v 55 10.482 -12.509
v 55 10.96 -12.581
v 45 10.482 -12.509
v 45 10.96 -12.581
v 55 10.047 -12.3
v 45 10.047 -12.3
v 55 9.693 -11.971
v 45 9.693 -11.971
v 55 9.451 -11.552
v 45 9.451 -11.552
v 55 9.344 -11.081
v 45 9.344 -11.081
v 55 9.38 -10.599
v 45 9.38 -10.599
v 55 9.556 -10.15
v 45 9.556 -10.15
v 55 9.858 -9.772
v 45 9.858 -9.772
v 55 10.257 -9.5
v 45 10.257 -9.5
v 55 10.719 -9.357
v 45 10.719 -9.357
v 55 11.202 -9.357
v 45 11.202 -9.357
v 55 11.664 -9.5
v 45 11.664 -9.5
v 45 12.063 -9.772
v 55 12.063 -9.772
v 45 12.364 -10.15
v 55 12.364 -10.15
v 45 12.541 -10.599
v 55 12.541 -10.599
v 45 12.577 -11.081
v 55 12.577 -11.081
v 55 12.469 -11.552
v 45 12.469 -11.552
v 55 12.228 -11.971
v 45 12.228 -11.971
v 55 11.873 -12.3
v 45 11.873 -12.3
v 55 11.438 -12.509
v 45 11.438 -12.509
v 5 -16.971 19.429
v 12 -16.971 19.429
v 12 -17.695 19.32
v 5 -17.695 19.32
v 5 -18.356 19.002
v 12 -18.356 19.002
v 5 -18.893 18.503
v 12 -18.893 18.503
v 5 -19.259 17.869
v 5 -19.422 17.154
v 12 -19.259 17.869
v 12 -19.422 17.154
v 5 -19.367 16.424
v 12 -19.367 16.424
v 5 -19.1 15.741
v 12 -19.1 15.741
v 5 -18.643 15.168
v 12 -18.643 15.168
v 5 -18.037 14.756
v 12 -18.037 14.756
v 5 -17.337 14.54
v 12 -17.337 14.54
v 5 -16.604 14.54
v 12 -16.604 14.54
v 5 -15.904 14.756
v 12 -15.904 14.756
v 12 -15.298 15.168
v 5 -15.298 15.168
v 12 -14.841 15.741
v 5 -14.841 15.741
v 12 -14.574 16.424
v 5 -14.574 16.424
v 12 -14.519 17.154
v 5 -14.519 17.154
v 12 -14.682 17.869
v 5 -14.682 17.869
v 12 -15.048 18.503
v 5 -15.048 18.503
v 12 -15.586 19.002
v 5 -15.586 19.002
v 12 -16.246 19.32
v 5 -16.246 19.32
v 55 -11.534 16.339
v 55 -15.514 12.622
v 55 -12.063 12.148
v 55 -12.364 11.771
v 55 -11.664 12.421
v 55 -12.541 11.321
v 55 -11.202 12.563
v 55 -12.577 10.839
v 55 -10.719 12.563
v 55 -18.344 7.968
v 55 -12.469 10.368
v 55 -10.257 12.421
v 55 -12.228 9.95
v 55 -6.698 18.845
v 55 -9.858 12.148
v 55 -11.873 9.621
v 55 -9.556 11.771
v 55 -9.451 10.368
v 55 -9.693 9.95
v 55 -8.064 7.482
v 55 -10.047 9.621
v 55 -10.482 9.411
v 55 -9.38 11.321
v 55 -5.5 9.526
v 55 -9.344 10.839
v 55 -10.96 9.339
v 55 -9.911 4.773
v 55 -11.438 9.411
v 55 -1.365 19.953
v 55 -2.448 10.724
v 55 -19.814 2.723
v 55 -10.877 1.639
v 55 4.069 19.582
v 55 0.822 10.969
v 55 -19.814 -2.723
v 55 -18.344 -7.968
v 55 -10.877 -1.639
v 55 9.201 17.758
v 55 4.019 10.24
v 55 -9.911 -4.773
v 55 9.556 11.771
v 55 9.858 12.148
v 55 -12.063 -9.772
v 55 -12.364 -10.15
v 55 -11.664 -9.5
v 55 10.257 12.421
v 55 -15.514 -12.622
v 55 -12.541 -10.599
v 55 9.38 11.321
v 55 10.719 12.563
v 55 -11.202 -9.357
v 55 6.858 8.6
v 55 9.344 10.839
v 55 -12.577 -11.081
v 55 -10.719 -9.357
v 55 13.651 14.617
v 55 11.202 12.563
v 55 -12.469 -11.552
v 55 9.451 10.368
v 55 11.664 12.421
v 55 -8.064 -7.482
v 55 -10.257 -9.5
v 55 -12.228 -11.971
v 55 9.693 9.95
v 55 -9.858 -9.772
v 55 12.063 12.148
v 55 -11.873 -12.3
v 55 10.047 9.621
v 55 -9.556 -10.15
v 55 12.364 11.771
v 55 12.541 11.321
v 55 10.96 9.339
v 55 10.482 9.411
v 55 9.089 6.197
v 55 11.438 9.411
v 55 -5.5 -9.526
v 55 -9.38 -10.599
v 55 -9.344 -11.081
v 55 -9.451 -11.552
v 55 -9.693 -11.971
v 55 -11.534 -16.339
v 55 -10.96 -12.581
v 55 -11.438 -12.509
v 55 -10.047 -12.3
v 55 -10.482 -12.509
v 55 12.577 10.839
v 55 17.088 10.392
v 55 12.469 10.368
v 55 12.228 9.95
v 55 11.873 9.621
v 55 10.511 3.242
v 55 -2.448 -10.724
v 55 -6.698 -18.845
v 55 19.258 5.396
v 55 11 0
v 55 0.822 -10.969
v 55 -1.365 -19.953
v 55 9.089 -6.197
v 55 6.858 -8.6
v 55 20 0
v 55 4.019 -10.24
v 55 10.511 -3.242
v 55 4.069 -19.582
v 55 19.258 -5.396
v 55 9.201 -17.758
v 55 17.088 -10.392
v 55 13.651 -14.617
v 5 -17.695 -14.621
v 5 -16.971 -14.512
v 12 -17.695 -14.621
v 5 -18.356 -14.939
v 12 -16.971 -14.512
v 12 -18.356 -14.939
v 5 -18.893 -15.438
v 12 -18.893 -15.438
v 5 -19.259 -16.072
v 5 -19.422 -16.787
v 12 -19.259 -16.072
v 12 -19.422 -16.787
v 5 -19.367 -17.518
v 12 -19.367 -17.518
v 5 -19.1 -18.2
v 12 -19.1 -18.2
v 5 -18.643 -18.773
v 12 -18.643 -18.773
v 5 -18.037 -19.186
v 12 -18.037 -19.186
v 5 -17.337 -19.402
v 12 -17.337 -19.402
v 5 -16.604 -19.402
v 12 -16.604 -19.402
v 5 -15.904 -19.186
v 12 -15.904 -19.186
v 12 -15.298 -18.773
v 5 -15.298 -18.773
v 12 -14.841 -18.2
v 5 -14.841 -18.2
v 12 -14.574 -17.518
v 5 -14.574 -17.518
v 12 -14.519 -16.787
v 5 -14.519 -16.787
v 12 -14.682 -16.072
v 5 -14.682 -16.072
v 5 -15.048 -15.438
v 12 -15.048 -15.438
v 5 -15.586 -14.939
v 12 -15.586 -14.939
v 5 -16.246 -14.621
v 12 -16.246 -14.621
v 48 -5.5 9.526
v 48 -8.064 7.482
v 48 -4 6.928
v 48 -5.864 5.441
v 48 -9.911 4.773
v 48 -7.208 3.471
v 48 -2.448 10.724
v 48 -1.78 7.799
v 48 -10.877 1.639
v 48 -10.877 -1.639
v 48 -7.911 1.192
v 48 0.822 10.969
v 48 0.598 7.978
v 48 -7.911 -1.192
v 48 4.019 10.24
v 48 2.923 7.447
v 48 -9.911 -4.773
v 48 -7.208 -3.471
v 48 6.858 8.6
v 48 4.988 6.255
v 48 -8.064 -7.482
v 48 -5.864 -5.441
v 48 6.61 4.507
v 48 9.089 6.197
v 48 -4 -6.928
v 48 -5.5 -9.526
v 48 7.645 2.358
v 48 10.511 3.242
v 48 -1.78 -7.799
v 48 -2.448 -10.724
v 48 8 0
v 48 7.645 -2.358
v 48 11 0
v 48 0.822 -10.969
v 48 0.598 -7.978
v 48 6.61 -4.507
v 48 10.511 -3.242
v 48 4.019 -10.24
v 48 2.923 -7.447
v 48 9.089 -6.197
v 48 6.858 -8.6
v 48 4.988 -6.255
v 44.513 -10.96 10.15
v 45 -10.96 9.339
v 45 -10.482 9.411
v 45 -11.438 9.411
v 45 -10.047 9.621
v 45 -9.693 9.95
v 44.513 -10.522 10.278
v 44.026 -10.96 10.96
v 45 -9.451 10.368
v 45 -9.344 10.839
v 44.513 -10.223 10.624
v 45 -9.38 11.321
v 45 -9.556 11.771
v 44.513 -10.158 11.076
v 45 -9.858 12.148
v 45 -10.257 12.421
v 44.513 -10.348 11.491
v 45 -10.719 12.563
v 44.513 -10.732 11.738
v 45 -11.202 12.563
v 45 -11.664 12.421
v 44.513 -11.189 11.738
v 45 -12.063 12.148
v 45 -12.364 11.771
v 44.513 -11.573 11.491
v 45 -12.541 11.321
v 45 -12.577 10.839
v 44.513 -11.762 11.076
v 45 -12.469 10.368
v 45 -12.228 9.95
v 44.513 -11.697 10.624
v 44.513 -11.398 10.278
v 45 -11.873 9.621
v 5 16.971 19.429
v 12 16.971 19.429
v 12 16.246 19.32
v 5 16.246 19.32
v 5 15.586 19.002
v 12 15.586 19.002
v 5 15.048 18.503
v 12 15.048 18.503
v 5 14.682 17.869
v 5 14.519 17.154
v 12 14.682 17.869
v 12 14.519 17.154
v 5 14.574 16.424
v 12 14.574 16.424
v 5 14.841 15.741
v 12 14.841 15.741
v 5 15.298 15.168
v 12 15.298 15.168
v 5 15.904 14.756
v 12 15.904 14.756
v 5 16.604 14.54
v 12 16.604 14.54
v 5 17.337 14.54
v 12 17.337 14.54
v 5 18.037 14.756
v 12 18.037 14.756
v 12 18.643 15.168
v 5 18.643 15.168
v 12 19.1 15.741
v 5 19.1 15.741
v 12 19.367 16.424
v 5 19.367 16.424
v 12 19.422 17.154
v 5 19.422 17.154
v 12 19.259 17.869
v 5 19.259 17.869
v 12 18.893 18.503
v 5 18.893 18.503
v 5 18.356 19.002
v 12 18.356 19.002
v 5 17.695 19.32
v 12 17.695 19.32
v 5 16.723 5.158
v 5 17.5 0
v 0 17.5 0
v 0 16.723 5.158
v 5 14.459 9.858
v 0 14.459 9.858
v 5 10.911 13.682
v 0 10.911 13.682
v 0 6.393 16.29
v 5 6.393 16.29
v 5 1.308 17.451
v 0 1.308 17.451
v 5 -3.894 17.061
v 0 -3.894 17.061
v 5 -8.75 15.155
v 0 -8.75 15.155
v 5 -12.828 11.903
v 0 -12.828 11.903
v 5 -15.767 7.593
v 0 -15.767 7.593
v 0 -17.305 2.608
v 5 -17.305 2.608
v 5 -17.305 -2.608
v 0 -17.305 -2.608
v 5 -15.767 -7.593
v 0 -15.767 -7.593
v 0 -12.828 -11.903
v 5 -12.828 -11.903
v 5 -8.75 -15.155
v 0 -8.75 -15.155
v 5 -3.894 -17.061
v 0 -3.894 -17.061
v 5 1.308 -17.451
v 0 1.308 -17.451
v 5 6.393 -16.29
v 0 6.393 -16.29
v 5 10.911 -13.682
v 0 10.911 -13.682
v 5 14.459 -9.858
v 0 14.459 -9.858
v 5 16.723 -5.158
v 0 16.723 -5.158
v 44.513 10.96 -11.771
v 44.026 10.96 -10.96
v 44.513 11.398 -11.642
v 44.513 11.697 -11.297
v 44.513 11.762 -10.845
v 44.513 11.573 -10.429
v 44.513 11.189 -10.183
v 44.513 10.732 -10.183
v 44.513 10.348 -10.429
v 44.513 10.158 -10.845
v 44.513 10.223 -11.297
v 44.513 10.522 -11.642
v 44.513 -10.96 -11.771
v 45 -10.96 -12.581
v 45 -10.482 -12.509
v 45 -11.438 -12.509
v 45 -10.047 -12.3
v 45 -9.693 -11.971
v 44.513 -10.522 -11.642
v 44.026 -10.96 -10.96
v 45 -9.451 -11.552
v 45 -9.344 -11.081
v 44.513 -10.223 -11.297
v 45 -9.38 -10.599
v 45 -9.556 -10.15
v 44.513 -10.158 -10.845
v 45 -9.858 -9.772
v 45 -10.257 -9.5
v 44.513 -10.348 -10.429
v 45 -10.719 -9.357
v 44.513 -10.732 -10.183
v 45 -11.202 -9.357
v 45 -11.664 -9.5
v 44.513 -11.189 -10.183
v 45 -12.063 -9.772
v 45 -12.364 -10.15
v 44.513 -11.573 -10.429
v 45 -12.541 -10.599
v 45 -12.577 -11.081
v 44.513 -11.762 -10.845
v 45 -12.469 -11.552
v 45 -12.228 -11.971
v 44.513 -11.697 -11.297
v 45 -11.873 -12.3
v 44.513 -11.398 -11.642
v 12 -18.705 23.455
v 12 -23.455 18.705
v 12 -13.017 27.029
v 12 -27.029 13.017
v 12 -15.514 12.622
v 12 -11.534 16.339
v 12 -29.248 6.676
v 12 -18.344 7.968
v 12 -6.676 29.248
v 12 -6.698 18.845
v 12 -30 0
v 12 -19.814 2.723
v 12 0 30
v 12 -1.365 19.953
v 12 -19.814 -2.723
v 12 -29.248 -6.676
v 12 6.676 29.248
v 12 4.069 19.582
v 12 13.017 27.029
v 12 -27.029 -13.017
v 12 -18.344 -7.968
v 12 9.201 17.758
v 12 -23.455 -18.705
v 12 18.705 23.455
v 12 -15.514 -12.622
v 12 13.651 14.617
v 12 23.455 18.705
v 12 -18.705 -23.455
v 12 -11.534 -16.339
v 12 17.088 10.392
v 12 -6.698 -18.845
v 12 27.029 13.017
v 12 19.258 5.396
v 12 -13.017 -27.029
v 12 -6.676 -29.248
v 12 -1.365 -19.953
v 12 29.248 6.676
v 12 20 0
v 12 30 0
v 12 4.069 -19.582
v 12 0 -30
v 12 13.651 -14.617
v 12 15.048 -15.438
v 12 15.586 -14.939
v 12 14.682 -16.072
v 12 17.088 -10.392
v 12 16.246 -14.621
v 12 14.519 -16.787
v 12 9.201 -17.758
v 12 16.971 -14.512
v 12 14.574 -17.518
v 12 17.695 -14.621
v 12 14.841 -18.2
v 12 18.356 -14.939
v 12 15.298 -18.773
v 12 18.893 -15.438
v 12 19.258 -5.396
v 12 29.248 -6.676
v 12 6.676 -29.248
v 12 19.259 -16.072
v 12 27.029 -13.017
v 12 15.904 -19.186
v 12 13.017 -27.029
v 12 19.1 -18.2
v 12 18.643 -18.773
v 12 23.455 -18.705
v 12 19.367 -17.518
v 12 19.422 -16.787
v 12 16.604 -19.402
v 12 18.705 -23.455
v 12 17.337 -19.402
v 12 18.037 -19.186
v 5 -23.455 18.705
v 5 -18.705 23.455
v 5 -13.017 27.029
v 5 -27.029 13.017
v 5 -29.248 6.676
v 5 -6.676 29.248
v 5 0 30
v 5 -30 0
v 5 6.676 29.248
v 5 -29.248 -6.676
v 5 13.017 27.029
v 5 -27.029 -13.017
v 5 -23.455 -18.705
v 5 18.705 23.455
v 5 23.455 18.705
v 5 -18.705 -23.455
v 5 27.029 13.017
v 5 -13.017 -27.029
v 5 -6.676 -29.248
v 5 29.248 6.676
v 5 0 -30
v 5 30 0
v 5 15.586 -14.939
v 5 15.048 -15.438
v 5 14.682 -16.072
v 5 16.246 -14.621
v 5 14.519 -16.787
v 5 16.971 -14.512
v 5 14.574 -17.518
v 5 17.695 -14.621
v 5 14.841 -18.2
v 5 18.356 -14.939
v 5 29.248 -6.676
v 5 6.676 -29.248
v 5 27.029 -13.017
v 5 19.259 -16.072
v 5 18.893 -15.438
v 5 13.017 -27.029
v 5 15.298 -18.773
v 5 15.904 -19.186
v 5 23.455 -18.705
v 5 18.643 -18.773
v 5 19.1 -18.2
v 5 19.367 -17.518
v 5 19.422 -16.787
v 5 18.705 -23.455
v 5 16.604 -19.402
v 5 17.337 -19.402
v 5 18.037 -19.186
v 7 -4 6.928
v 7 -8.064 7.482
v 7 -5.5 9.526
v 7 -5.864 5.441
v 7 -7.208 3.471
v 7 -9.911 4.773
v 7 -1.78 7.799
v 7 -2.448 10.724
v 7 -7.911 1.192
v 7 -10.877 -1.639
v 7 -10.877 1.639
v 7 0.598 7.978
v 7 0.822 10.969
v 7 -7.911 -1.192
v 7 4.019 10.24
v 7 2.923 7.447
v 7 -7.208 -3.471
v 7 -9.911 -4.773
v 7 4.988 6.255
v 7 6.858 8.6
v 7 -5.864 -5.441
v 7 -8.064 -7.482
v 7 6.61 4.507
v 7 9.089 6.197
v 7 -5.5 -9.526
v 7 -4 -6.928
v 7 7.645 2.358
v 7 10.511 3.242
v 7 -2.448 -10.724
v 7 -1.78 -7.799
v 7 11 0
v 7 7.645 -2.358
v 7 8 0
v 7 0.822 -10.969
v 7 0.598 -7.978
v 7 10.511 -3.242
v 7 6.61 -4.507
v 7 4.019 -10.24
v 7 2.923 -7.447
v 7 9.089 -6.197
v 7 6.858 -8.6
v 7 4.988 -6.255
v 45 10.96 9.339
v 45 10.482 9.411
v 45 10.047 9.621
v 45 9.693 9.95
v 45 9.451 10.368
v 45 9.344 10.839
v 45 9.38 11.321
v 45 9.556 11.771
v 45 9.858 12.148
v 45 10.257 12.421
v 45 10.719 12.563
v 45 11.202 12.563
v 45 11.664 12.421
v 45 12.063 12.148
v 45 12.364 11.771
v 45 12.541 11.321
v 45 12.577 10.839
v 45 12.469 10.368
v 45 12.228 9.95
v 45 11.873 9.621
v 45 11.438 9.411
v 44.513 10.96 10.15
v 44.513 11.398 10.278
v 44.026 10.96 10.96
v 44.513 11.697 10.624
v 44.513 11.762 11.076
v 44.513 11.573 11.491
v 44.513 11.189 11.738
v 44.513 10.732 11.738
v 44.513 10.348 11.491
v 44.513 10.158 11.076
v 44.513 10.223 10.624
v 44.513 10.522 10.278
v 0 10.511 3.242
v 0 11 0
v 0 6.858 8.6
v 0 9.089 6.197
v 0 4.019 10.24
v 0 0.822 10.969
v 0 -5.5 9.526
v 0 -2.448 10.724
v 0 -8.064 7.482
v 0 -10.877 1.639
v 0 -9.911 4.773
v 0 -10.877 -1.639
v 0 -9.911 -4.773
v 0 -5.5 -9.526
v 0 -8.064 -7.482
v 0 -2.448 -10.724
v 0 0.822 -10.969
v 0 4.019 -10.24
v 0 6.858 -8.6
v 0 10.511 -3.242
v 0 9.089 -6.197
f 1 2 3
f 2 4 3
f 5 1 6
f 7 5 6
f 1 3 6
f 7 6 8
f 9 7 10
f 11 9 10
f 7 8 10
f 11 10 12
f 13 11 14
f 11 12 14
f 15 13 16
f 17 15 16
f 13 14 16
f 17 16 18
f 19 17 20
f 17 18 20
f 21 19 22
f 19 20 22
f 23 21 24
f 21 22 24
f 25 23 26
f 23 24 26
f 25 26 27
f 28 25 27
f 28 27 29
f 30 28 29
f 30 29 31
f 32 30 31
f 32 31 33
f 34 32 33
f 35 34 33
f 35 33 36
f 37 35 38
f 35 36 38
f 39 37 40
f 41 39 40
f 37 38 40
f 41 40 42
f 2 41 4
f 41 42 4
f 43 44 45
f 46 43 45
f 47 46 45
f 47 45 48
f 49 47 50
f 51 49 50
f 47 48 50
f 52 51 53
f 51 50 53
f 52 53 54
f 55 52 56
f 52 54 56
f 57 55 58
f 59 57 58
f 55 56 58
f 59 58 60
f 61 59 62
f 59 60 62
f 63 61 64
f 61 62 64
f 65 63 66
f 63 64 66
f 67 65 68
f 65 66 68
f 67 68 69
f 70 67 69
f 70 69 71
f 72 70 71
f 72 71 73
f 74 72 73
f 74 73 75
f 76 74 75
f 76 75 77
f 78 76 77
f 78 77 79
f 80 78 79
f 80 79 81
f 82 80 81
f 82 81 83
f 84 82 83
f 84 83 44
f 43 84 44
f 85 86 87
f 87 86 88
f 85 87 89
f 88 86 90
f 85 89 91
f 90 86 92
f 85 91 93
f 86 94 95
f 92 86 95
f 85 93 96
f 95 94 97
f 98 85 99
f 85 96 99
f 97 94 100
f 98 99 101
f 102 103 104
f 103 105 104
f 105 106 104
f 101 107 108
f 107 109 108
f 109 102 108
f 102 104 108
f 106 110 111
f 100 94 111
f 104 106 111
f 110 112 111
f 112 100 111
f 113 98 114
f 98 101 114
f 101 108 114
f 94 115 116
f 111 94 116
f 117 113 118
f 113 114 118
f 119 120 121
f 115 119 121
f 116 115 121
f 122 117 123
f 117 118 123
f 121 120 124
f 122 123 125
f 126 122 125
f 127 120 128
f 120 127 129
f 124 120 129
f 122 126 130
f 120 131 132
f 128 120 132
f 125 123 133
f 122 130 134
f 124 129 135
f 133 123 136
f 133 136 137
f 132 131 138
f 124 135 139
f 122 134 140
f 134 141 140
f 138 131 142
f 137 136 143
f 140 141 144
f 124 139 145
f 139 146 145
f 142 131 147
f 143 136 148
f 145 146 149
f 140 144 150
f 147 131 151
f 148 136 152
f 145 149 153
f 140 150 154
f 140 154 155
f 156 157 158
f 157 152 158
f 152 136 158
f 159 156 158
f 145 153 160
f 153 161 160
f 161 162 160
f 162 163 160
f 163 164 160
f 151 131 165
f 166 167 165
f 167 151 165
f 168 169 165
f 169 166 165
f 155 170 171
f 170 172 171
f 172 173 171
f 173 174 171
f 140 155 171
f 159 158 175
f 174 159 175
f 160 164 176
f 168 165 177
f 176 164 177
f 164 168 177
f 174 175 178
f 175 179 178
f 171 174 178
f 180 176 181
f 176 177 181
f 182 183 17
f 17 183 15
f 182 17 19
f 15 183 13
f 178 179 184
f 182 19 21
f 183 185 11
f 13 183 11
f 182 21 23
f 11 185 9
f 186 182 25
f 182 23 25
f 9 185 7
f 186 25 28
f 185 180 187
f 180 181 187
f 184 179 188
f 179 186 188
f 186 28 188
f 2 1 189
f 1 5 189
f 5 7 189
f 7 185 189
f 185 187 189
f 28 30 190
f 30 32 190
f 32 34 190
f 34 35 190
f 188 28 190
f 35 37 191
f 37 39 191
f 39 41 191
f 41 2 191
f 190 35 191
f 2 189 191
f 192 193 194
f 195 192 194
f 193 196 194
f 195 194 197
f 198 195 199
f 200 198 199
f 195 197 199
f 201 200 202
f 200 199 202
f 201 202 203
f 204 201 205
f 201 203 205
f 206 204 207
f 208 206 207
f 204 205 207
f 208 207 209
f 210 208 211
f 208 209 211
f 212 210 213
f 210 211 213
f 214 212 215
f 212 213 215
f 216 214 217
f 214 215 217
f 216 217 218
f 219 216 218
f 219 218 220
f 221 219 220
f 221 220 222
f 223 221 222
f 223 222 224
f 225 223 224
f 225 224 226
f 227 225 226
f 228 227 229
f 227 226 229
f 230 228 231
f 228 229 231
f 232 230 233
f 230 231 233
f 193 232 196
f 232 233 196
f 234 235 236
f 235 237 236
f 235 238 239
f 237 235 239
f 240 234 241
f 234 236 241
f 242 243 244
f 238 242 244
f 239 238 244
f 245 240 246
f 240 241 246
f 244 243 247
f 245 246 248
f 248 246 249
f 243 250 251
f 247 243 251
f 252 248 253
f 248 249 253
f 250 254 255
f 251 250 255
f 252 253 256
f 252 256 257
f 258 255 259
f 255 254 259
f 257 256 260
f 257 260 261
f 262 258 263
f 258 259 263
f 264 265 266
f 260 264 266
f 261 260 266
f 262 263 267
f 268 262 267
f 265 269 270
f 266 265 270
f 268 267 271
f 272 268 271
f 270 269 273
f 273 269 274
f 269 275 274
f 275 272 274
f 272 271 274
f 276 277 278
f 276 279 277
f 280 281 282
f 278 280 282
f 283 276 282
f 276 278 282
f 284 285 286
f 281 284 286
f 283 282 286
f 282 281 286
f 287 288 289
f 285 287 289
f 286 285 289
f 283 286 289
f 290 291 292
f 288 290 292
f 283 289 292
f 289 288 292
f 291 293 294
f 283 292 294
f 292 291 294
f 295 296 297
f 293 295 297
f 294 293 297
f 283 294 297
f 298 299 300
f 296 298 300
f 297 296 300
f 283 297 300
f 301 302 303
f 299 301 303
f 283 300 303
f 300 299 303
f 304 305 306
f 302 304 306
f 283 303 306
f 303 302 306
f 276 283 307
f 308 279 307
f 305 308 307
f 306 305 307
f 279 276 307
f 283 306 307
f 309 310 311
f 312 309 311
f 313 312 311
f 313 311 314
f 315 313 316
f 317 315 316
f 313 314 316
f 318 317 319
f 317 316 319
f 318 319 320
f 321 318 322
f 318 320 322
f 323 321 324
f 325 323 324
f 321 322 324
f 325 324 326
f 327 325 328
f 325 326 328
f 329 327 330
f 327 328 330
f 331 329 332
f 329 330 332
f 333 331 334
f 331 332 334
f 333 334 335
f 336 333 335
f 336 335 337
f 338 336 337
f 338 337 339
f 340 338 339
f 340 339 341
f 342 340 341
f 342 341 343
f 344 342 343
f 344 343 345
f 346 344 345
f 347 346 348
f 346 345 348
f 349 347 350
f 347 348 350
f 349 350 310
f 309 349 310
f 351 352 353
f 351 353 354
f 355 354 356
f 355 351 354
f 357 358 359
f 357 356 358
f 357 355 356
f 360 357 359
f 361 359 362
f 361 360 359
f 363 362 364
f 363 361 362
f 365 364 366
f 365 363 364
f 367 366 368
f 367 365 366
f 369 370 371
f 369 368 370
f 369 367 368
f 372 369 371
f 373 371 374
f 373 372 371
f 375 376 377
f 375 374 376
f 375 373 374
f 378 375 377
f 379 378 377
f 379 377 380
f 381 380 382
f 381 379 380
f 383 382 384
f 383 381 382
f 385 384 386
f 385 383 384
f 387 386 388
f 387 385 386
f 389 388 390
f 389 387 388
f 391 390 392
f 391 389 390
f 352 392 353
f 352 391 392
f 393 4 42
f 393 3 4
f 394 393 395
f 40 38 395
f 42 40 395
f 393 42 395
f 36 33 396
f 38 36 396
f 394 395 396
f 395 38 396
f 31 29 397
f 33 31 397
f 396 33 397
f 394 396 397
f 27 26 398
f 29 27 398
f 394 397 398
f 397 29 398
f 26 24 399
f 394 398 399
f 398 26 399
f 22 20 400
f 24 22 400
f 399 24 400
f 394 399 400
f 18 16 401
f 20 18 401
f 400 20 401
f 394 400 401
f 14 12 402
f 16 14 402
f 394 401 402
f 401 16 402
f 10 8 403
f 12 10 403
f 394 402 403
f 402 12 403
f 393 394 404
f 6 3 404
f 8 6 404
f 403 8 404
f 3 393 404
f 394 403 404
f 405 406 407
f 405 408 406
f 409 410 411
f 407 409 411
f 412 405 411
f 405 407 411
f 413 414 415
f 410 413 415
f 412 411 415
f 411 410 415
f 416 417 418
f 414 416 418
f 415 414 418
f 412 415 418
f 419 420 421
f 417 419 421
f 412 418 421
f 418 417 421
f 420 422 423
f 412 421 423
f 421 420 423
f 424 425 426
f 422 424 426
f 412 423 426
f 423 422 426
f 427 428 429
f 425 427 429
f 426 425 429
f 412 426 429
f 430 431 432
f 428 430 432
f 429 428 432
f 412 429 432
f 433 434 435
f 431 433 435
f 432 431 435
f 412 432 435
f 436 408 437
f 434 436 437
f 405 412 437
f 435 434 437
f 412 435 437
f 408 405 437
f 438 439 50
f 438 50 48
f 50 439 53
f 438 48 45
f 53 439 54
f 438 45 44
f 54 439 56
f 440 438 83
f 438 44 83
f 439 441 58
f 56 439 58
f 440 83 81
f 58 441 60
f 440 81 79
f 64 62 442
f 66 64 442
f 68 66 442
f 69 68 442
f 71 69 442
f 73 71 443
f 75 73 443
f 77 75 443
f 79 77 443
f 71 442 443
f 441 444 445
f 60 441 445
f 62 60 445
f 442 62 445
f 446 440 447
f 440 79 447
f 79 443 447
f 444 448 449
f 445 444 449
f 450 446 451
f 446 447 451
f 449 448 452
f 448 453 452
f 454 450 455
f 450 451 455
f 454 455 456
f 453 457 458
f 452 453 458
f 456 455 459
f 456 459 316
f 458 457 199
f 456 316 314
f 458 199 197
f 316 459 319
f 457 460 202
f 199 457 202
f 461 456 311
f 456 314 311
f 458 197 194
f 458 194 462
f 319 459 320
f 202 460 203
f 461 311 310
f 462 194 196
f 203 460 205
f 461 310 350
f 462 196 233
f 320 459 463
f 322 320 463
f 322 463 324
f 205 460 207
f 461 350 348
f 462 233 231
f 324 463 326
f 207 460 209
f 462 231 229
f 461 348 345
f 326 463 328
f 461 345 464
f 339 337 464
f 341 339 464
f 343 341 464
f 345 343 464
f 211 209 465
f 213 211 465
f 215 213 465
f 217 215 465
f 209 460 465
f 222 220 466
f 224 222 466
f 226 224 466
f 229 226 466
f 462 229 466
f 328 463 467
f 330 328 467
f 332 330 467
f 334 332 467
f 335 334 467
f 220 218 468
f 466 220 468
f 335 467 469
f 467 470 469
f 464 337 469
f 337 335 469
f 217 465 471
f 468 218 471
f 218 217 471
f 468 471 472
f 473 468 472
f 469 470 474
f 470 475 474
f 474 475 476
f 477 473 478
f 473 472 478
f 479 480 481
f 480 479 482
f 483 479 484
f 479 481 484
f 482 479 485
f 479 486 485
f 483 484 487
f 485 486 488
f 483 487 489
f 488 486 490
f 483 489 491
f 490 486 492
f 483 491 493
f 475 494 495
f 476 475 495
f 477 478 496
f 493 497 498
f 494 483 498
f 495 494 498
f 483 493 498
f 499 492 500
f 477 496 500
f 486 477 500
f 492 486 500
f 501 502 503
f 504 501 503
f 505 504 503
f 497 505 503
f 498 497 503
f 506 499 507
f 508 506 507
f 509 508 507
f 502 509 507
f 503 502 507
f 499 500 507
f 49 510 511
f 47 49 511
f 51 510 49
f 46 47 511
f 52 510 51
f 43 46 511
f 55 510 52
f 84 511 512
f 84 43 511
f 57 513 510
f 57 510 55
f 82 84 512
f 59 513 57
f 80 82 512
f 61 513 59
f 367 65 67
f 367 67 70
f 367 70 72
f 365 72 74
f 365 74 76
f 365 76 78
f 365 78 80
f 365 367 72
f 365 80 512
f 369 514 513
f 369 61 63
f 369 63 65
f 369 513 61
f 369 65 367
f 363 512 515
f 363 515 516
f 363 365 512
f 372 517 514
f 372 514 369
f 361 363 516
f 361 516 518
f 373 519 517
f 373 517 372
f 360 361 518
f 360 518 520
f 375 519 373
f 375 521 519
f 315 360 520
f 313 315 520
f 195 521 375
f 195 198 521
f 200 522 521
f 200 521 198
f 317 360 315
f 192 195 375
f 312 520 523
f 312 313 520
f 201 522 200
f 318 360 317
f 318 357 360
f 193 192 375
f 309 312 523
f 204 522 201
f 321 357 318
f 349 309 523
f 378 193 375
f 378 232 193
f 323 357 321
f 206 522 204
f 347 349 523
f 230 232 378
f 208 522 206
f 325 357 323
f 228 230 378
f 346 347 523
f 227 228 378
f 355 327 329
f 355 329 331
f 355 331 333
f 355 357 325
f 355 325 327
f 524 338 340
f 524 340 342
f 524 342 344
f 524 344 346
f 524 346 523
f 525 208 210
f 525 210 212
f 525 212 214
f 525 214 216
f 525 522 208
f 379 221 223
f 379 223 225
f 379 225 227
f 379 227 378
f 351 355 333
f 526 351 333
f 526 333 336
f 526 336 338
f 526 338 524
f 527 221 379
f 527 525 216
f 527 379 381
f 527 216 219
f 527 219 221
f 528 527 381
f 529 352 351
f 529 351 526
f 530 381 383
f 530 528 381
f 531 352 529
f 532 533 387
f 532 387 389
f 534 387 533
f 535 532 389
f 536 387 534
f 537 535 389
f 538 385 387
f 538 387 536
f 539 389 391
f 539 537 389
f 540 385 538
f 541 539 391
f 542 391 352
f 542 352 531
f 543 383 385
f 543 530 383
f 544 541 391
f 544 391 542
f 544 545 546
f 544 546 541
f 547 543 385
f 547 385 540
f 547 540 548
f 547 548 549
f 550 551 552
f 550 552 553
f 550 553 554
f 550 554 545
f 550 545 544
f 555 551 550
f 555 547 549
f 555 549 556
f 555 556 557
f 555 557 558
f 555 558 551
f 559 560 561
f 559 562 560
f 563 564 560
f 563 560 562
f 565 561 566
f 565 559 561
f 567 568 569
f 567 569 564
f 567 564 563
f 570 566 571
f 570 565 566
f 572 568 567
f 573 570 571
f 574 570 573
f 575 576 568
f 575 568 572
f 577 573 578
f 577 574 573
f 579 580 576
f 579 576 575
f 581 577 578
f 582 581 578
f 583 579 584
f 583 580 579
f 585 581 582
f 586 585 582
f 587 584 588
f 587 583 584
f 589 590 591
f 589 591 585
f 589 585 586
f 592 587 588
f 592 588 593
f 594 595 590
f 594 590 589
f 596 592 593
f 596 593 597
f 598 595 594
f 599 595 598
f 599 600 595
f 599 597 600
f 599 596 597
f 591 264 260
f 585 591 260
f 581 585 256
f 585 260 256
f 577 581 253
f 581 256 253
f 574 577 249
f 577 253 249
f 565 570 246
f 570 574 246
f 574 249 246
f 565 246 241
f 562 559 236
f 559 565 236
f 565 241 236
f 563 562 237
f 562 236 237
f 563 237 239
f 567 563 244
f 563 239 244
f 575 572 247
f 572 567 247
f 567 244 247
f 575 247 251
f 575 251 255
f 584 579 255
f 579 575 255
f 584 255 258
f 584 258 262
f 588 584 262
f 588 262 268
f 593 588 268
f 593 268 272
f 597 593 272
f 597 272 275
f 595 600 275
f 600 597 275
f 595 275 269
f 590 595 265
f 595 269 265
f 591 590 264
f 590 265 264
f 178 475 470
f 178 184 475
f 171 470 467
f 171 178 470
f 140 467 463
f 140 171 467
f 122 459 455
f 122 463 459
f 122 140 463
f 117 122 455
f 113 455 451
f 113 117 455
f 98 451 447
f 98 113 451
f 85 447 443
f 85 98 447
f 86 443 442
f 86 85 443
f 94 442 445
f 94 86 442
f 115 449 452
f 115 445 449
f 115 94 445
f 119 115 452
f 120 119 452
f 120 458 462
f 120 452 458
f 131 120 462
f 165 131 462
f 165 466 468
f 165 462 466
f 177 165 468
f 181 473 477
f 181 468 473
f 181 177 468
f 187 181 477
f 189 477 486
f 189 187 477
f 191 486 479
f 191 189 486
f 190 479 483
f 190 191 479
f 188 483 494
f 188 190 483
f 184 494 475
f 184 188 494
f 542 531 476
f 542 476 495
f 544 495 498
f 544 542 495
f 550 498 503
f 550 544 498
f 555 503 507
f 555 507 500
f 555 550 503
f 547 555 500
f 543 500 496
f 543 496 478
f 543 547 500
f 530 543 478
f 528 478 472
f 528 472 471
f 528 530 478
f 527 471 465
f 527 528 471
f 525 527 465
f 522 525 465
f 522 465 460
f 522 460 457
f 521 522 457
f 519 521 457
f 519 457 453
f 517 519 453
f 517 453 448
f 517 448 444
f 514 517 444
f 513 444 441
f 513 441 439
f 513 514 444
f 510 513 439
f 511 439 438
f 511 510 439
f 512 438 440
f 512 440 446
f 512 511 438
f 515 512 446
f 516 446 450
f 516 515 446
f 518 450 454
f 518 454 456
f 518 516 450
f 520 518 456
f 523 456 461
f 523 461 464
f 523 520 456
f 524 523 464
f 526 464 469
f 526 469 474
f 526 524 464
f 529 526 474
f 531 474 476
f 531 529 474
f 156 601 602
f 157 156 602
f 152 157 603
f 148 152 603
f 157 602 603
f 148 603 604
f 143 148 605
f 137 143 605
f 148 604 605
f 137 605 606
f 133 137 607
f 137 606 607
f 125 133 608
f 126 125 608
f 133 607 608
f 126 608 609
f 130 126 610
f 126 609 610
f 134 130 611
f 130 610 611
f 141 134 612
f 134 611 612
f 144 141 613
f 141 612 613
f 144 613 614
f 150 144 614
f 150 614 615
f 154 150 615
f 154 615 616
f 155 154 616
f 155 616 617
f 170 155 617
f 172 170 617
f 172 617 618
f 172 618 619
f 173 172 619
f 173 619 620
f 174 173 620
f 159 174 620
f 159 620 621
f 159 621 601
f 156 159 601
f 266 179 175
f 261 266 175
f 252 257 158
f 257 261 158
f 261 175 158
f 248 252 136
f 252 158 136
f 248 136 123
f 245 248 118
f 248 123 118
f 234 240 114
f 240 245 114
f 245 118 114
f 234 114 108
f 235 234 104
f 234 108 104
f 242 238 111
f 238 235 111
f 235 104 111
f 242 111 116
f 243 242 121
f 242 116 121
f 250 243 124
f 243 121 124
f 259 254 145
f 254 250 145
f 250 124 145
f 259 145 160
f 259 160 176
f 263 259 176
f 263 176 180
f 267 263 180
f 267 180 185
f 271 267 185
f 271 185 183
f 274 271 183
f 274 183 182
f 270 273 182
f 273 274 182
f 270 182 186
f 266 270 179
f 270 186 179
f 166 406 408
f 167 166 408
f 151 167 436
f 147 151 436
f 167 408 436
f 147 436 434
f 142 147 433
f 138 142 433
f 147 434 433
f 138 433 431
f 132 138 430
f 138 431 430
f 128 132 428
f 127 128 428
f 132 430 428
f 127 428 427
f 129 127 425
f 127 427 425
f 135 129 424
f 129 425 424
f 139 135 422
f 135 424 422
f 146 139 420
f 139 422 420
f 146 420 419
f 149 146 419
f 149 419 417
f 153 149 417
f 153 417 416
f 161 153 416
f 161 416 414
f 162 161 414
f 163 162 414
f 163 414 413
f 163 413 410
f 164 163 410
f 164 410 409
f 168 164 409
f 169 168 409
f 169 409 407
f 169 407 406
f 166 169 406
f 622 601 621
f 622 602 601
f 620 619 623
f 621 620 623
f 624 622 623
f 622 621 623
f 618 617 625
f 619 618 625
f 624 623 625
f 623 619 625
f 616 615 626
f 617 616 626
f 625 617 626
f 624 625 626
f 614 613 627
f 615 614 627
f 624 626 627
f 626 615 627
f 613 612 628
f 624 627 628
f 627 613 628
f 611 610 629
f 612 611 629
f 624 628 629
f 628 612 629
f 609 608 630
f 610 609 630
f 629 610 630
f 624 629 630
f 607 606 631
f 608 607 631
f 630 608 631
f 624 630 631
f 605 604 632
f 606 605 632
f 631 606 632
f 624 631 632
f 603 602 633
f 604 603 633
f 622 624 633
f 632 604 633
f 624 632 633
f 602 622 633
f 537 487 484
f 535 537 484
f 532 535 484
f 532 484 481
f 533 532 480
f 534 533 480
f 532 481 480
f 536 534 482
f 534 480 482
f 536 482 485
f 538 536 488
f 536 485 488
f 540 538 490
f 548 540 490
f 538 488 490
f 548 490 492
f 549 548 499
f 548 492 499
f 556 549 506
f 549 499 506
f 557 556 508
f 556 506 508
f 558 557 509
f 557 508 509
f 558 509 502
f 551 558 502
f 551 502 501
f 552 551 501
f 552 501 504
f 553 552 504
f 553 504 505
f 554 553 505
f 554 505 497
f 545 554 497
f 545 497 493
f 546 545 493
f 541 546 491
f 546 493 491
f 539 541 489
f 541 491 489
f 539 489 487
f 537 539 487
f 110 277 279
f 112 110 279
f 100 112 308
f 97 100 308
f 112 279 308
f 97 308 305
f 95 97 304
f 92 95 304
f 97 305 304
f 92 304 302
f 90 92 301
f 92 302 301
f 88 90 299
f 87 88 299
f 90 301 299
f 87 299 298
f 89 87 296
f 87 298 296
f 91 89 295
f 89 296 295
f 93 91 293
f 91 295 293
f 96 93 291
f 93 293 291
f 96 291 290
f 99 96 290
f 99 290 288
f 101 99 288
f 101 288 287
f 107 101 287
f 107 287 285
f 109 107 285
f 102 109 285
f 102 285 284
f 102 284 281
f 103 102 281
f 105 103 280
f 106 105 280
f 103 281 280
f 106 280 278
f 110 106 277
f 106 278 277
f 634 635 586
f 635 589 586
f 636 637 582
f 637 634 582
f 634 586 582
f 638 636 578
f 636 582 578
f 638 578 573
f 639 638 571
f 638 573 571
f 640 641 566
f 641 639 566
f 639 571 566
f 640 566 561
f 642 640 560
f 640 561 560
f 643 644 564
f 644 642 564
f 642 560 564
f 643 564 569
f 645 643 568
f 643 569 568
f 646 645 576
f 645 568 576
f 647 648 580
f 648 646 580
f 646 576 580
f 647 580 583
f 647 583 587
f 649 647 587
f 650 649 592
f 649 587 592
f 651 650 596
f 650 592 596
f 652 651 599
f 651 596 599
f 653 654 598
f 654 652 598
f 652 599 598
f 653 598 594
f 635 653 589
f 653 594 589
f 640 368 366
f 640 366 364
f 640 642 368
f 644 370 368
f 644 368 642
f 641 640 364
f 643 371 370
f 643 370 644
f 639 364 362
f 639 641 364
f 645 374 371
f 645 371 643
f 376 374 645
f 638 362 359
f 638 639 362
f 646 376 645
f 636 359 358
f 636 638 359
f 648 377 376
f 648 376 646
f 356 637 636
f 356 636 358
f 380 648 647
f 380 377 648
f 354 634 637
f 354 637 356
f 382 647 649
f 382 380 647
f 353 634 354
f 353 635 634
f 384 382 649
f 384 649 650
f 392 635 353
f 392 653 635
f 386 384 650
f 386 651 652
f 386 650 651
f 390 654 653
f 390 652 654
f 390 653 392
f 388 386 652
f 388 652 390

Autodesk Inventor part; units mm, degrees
ref_plane "YZ Plane" through (0, 0, 0) normal (1, 0, 0) x (0, 1, 0)
ref_plane "XZ Plane" through (0, 0, 0) normal (0, 1, 0) x (-1, 0, 0)
ref_plane "XY Plane" through (0, 0, 0) normal (0, 0, 1) x (1, 0, 0)
sketch "Skizze1" plane through (0, 0, 0) normal (0, 0, 1) x (1, 0, 0)
  line L0 (0, 0) -> (0, 17.5)
  line L1 (0, 17.5) -> (5, 17.5)
  line L2 (5, 17.5) -> (5, 20)
  line L3 (5, 20) -> (55, 20)
  line L4 (55, 20) -> (55, 0)
  line L5 (55, 0) -> (0, 0)
  line L6 (0, 11) -> (7, 11)
  line L7 (7, 11) -> (7, 8)
  line L8 (7, 8) -> (48, 8)
  line L9 (48, 8) -> (48, 11)
  line L10 (48, 11) -> (55, 11)
  line L11 (5, 20) -> (12, 20)
  line L12 (12, 20) -> (12, 30)
  line L13 (12, 30) -> (5, 30)
  line L14 (5, 30) -> (5, 20)
  dimension "d1" = 17.5
  dimension "d2" = 5
  dimension "d4" = 50
  dimension "d5" = 8
  dimension "d6" = 11
  dimension "d7" = 7
  dimension "d8" = 7
  dimension "d31" = 20
  dimension "d32" = 7
  dimension "d33" = 30
revolve "Umdrehung1" add sketch "Skizze1" angle 360 about axis through (55, 0, 0) along (-1, 0, 0) contours L0 L1 L2 L3 L4 L10 L9 L8 L7 L6 | L14 L13 L12 L3
sketch "Skizze4" plane through (55, 0, 0) normal (1, 0, 0) x (0, 0, -1)
  circle A0 centre (0, 0) radius 15.5
  circle A1 centre (0, 0) radius 11 projected
  circle A2 centre (0, 0) radius 20 projected
  line L0 (10.9602, 10.9602) -> (10.9602, -10.9602)
  line L1 (10.9602, -10.9602) -> (-10.9602, -10.9602)
  line L2 (-10.9602, -10.9602) -> (-10.9602, 10.9602)
  line L3 (-10.9602, 10.9602) -> (10.9602, 10.9602)
  dimension "d20" = 4.5
  dimension "d21" = 4.5
hole "Bohrung2" at (55, 10.9602, -10.9602) at (55, -10.9602, -10.9602) at (55, -10.9602, 10.9602) at (55, 10.9602, 10.9602) direction (-1, 0, 0) diameter 3.242 depth 10 tip angle 118 thread size "M4x0.7" class "6H" standard "ANSI Metric M Profile"
sketch "Skizze6" plane through (5, 0, 0) normal (-1, 0, 0) x (0, 0, 1)
  circle A0 centre (0, 0) radius 24
  line L0 (-16.9706, 16.9706) -> (16.9706, 16.9706)
  line L1 (16.9706, 16.9706) -> (16.9706, -16.9706)
  line L2 (16.9706, -16.9706) -> (-16.9706, -16.9706)
  line L3 (-16.9706, -16.9706) -> (-16.9706, 16.9706)
  dimension "d34" = 48
hole "Bohrung3" at (5, 16.9706, -16.9706) at (5, -16.9706, -16.9706) at (5, -16.9706, 16.9706) at (5, 16.9706, 16.9706) direction (1, 0, 0) diameter 4.917 depth 17.1 tip angle 118 thread size "M6x1" class "6H" standard "ISO Metric profile"
equation "\"d20\" = d21"
properties part number "Lagerhalter"
